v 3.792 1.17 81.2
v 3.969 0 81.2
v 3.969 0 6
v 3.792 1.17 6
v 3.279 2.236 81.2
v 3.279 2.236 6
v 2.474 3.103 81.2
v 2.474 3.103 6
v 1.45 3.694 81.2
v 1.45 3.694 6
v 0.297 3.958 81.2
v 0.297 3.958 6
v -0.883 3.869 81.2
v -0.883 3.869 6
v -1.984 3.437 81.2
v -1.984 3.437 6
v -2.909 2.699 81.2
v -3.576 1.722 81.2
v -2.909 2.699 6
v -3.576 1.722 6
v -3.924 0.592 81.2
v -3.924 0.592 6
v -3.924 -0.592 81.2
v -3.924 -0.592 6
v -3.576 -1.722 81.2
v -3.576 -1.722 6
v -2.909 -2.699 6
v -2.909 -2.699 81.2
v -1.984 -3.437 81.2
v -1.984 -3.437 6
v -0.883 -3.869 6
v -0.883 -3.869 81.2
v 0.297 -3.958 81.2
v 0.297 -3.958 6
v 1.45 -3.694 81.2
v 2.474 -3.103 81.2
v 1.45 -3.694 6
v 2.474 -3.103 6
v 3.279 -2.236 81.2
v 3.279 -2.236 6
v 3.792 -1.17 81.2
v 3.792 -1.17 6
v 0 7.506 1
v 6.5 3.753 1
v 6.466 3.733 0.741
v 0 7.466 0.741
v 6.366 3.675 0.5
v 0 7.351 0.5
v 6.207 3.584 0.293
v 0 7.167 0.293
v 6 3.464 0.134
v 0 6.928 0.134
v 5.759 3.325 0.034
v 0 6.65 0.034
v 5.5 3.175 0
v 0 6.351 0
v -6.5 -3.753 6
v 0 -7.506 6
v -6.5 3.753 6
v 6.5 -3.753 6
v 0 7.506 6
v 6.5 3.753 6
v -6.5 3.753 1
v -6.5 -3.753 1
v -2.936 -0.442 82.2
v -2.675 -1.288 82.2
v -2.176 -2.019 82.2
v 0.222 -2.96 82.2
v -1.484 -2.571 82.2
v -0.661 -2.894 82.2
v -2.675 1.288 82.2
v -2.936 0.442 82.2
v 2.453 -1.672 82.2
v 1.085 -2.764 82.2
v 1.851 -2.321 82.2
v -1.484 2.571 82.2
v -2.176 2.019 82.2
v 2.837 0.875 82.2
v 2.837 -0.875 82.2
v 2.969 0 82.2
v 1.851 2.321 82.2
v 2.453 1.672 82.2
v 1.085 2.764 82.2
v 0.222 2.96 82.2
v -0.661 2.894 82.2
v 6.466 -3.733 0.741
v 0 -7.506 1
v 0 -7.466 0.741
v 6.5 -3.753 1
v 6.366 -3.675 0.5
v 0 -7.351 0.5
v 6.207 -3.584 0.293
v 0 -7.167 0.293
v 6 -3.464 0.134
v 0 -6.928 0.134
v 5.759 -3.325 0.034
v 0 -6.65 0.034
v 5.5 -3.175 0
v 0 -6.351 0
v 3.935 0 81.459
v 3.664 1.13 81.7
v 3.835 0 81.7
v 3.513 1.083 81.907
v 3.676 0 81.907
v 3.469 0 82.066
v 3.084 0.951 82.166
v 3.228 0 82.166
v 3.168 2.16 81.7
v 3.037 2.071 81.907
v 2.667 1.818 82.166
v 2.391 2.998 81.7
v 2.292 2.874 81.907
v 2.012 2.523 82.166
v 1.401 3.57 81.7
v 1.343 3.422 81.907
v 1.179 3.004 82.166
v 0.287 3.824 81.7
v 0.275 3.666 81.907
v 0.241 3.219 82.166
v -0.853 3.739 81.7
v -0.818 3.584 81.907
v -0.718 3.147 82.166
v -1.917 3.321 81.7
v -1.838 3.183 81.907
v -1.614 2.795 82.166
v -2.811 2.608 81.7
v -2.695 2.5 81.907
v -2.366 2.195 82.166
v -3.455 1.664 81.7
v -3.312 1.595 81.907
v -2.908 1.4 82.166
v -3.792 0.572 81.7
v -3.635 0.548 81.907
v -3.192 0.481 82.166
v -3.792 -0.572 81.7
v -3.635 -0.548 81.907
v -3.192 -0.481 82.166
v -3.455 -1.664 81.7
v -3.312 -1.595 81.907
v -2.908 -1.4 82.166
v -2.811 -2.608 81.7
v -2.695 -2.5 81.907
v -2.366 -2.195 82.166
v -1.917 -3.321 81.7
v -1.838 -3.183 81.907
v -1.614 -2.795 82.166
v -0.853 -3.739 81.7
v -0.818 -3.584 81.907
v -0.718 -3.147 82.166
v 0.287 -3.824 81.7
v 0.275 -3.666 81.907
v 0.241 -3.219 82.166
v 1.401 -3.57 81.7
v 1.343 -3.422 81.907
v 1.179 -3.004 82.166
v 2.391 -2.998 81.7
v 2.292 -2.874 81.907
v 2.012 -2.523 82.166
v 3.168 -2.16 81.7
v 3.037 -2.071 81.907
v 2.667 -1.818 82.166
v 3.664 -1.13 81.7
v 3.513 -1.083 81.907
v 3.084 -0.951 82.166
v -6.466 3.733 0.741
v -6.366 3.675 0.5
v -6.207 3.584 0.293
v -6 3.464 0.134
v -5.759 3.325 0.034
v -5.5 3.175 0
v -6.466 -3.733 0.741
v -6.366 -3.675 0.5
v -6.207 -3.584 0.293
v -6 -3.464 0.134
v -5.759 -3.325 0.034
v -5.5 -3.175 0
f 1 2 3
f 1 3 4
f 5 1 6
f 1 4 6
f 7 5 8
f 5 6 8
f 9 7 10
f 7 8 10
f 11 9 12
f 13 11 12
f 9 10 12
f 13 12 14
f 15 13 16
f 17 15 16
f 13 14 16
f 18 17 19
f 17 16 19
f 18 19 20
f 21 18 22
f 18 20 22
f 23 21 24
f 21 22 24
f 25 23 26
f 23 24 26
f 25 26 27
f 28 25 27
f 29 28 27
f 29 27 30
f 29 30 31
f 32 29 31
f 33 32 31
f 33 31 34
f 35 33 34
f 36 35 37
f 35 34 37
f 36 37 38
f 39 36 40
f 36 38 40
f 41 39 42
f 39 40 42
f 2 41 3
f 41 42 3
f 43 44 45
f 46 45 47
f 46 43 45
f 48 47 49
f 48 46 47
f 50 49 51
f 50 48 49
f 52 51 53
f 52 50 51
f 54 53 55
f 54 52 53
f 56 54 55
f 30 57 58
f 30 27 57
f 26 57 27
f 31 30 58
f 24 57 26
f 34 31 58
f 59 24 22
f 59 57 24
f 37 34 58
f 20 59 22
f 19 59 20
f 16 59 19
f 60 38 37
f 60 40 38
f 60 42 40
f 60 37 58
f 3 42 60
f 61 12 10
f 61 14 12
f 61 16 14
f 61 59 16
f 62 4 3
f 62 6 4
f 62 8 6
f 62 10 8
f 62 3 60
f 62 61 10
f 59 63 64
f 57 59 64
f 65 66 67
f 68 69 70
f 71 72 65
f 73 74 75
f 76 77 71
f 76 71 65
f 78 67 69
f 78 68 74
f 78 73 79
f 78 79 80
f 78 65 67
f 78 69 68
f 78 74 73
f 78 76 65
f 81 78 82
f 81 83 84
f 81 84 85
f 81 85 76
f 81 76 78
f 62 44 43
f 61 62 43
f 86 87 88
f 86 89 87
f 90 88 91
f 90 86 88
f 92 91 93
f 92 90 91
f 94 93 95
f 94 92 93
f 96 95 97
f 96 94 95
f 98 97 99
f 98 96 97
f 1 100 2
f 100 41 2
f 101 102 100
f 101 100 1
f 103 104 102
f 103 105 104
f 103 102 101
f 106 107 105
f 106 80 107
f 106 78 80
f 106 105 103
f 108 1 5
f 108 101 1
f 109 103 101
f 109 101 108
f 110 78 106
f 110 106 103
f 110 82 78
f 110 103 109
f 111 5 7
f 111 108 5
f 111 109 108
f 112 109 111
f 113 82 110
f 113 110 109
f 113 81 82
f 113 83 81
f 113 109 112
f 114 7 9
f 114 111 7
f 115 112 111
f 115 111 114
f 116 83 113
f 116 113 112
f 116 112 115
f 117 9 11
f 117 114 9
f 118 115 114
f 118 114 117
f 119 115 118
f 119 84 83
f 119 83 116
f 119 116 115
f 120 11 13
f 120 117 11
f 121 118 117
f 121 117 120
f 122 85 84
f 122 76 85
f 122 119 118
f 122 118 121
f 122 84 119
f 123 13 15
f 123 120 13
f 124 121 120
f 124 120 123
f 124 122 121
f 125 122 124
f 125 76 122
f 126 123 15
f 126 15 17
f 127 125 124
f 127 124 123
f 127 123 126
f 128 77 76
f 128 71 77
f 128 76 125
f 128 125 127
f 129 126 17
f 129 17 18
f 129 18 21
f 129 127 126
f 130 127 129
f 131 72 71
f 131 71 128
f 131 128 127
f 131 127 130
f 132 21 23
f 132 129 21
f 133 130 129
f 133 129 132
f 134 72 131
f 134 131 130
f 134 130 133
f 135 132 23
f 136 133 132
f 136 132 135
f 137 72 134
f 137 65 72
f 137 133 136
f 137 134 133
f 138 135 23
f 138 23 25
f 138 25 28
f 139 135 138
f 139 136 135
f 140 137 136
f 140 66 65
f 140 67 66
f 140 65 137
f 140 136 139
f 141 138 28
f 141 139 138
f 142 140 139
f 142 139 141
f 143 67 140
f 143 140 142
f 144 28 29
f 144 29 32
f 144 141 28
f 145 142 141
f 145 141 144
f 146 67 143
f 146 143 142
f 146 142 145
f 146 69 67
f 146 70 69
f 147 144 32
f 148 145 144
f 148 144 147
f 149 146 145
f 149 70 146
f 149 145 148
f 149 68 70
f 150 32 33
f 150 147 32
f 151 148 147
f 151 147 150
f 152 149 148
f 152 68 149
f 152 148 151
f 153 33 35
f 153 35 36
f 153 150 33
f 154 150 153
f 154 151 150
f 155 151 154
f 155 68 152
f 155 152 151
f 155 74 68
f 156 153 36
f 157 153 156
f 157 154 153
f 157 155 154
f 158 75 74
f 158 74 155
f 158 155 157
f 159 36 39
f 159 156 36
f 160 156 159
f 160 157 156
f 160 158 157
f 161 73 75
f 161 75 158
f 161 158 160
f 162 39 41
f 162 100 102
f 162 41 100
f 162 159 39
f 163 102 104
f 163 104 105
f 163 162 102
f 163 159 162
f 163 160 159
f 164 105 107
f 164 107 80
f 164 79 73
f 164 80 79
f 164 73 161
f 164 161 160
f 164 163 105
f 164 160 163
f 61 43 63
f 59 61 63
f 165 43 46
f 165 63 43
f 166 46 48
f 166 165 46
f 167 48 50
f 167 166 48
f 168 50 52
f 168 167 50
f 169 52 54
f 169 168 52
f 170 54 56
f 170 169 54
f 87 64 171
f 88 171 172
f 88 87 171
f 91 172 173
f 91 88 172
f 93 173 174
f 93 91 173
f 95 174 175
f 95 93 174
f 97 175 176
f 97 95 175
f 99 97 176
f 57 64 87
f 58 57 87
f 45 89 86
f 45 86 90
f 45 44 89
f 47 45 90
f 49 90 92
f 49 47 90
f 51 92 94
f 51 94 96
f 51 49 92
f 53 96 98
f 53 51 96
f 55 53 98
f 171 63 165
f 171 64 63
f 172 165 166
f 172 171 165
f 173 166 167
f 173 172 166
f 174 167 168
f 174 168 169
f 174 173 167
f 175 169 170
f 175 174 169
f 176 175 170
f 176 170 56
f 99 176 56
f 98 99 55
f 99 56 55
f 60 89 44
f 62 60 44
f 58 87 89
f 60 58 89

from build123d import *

# Parameters (mm, degrees)
SKETCH001_R      = 3.96875
EXTRUDE001_DEPTH = 76.2
EXTRUDE_DEPTH    = 6
FILLET_R         = 1
FILLET001_R      = 1


with BuildPart() as extrude001:
    # Sketch001 (on Face8 of Extrude) → Extrude001 (new body)
    with BuildSketch(Plane.XY.offset(6)):
        Circle(SKETCH001_R)
    extrude(amount=EXTRUDE001_DEPTH)


with BuildPart() as fillet001:
    # Sketch → Extrude (new body)
    with BuildSketch(Plane.XY):
        Polygon((0, -7.505553), (6.5, -3.752777), (6.5, 3.752777), (0, 7.505553), (-6.5, 3.752777), (-6.5, -3.752777), align=None)
    extrude(amount=EXTRUDE_DEPTH)

    # Fusion: union Extrude001
    add(extrude001.part)

    # Fillet
    fillet_edges = [fillet001.edges().sort_by_distance(p)[0] for p in [
        (-3.96875, 0, 82.2),
    ]]
    fillet(fillet_edges, radius=FILLET_R)

    # Fillet001
    fillet001_edges = [fillet001.edges().sort_by_distance(p)[0] for p in [
        (3.25, -5.629165, 0),
        (-3.25, -5.629165, 0),
        (6.5, 0, 0),
        (-6.5, 0, 0),
        (3.25, 5.629165, 0),
        (-3.25, 5.629165, 0),
    ]]
    fillet(fillet001_edges, radius=FILLET001_R)


solid = fillet001.part
